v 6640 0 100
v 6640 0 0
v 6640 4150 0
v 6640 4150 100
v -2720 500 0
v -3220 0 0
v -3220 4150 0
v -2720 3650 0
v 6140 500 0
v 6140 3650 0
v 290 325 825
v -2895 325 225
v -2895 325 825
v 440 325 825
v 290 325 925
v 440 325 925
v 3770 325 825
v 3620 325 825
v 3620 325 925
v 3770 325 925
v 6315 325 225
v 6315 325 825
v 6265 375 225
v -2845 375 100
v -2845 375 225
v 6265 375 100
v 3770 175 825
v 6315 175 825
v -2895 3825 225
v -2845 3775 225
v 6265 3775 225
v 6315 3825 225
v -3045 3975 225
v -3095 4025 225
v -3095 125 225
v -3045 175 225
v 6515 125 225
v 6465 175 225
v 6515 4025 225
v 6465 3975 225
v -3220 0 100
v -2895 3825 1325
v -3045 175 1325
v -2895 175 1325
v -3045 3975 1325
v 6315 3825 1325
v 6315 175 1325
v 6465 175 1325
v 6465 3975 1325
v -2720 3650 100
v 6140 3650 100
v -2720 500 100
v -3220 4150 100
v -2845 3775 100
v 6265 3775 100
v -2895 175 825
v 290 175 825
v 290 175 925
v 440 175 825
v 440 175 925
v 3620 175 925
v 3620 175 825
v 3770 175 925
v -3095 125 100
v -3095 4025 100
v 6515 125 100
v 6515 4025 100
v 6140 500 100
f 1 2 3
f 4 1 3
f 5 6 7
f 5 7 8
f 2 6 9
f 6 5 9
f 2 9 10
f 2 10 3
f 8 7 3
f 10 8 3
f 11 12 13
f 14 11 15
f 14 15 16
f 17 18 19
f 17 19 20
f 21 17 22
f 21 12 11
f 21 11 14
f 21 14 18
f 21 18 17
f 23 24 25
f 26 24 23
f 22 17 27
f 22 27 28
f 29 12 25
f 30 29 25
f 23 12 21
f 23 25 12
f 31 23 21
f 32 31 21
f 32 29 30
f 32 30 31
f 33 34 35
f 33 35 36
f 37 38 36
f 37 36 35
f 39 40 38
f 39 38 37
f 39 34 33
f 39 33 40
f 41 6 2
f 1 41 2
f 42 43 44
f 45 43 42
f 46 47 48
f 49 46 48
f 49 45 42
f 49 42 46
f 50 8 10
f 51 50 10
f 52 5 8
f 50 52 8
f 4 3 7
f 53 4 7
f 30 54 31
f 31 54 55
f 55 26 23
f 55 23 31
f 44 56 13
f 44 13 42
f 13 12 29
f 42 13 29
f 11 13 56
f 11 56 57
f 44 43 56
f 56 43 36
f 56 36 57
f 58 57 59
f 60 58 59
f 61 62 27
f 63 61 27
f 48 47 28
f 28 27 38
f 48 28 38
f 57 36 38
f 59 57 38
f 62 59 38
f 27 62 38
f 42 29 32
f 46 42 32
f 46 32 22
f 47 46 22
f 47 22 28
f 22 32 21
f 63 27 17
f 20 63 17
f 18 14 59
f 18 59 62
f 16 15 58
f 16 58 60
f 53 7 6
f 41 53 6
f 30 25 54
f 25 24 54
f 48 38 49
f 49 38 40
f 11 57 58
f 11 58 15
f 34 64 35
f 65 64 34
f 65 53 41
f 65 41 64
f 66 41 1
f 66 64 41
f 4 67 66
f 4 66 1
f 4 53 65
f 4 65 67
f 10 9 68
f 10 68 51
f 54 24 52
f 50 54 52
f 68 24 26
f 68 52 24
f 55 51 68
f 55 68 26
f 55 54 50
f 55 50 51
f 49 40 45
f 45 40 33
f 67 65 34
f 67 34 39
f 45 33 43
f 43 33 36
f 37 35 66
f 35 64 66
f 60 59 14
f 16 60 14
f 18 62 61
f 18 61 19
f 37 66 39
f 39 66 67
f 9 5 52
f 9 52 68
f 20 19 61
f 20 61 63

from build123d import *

# Parameters (mm, degrees)
F0_W      = 8860
F0_H      = 3150
F1_DEPTH  = 100
F2_W      = 9610
F2_H      = 3900
F2_W_2    = 9110
F2_H_2    = 3400
F3_DEPTH  = 100
F4_DEPTH  = 25
F6_DEPTH  = 1100
F7_W      = 9210
F7_H      = 150
F8_DEPTH  = 600
F9_W      = 150
F9_H      = 150
F10_DEPTH = 100


with BuildPart() as f1:
    # F0 (on Top) → F1 (new body)
    with BuildSketch(Plane.XY):
        Polygon((-3220, 0), (-2720, 0), (6140, 0), (6640, 0), (6640, 4150), (-3220, 4150), align=None)
        with Locations((1710, 2075)):
            Rectangle(F0_W, F0_H, mode=Mode.SUBTRACT)
    extrude(amount=F1_DEPTH)

    # F2 (on face) → F3 (join)
    with BuildSketch(Plane.XY.offset(100)):
        with Locations((1710, 2075)):
            Rectangle(F2_W, F2_H)
        with Locations((1710, 2075)):
            Rectangle(F2_W_2, F2_H_2, mode=Mode.SUBTRACT)
    extrude(amount=F3_DEPTH)

    # F4 (add): a face of the model
    f4_faces = [f1.faces().sort_by_distance(p)[0] for p in [
        (-2991.2878502778, 2075, 200),
    ]]
    extrude(f4_faces, amount=F4_DEPTH)

    # F5 (on face) → F6 (join)
    with BuildSketch(Plane.XY.offset(225)):
        Polygon((-3045, 3975), (-3045, 175), (-2895, 175), (-2895, 3825), (6315, 3825), (6315, 175), (6465, 175), (6465, 3975), align=None)
    extrude(amount=F6_DEPTH)

    # F7 (on face) → F8 (join)
    with BuildSketch(Plane.XY.offset(225)):
        with Locations((1710, 250)):
            Rectangle(F7_W, F7_H)
    extrude(amount=F8_DEPTH)

    # F9 (on face) → F10 (join)
    with BuildSketch(Plane.XY.offset(825)):
        with Locations((365, 250)):
            Rectangle(F9_W, F9_H)
        with Locations((3695, 250)):
            Rectangle(F9_W, F9_H)
    extrude(amount=F10_DEPTH)


solid = f1.part
